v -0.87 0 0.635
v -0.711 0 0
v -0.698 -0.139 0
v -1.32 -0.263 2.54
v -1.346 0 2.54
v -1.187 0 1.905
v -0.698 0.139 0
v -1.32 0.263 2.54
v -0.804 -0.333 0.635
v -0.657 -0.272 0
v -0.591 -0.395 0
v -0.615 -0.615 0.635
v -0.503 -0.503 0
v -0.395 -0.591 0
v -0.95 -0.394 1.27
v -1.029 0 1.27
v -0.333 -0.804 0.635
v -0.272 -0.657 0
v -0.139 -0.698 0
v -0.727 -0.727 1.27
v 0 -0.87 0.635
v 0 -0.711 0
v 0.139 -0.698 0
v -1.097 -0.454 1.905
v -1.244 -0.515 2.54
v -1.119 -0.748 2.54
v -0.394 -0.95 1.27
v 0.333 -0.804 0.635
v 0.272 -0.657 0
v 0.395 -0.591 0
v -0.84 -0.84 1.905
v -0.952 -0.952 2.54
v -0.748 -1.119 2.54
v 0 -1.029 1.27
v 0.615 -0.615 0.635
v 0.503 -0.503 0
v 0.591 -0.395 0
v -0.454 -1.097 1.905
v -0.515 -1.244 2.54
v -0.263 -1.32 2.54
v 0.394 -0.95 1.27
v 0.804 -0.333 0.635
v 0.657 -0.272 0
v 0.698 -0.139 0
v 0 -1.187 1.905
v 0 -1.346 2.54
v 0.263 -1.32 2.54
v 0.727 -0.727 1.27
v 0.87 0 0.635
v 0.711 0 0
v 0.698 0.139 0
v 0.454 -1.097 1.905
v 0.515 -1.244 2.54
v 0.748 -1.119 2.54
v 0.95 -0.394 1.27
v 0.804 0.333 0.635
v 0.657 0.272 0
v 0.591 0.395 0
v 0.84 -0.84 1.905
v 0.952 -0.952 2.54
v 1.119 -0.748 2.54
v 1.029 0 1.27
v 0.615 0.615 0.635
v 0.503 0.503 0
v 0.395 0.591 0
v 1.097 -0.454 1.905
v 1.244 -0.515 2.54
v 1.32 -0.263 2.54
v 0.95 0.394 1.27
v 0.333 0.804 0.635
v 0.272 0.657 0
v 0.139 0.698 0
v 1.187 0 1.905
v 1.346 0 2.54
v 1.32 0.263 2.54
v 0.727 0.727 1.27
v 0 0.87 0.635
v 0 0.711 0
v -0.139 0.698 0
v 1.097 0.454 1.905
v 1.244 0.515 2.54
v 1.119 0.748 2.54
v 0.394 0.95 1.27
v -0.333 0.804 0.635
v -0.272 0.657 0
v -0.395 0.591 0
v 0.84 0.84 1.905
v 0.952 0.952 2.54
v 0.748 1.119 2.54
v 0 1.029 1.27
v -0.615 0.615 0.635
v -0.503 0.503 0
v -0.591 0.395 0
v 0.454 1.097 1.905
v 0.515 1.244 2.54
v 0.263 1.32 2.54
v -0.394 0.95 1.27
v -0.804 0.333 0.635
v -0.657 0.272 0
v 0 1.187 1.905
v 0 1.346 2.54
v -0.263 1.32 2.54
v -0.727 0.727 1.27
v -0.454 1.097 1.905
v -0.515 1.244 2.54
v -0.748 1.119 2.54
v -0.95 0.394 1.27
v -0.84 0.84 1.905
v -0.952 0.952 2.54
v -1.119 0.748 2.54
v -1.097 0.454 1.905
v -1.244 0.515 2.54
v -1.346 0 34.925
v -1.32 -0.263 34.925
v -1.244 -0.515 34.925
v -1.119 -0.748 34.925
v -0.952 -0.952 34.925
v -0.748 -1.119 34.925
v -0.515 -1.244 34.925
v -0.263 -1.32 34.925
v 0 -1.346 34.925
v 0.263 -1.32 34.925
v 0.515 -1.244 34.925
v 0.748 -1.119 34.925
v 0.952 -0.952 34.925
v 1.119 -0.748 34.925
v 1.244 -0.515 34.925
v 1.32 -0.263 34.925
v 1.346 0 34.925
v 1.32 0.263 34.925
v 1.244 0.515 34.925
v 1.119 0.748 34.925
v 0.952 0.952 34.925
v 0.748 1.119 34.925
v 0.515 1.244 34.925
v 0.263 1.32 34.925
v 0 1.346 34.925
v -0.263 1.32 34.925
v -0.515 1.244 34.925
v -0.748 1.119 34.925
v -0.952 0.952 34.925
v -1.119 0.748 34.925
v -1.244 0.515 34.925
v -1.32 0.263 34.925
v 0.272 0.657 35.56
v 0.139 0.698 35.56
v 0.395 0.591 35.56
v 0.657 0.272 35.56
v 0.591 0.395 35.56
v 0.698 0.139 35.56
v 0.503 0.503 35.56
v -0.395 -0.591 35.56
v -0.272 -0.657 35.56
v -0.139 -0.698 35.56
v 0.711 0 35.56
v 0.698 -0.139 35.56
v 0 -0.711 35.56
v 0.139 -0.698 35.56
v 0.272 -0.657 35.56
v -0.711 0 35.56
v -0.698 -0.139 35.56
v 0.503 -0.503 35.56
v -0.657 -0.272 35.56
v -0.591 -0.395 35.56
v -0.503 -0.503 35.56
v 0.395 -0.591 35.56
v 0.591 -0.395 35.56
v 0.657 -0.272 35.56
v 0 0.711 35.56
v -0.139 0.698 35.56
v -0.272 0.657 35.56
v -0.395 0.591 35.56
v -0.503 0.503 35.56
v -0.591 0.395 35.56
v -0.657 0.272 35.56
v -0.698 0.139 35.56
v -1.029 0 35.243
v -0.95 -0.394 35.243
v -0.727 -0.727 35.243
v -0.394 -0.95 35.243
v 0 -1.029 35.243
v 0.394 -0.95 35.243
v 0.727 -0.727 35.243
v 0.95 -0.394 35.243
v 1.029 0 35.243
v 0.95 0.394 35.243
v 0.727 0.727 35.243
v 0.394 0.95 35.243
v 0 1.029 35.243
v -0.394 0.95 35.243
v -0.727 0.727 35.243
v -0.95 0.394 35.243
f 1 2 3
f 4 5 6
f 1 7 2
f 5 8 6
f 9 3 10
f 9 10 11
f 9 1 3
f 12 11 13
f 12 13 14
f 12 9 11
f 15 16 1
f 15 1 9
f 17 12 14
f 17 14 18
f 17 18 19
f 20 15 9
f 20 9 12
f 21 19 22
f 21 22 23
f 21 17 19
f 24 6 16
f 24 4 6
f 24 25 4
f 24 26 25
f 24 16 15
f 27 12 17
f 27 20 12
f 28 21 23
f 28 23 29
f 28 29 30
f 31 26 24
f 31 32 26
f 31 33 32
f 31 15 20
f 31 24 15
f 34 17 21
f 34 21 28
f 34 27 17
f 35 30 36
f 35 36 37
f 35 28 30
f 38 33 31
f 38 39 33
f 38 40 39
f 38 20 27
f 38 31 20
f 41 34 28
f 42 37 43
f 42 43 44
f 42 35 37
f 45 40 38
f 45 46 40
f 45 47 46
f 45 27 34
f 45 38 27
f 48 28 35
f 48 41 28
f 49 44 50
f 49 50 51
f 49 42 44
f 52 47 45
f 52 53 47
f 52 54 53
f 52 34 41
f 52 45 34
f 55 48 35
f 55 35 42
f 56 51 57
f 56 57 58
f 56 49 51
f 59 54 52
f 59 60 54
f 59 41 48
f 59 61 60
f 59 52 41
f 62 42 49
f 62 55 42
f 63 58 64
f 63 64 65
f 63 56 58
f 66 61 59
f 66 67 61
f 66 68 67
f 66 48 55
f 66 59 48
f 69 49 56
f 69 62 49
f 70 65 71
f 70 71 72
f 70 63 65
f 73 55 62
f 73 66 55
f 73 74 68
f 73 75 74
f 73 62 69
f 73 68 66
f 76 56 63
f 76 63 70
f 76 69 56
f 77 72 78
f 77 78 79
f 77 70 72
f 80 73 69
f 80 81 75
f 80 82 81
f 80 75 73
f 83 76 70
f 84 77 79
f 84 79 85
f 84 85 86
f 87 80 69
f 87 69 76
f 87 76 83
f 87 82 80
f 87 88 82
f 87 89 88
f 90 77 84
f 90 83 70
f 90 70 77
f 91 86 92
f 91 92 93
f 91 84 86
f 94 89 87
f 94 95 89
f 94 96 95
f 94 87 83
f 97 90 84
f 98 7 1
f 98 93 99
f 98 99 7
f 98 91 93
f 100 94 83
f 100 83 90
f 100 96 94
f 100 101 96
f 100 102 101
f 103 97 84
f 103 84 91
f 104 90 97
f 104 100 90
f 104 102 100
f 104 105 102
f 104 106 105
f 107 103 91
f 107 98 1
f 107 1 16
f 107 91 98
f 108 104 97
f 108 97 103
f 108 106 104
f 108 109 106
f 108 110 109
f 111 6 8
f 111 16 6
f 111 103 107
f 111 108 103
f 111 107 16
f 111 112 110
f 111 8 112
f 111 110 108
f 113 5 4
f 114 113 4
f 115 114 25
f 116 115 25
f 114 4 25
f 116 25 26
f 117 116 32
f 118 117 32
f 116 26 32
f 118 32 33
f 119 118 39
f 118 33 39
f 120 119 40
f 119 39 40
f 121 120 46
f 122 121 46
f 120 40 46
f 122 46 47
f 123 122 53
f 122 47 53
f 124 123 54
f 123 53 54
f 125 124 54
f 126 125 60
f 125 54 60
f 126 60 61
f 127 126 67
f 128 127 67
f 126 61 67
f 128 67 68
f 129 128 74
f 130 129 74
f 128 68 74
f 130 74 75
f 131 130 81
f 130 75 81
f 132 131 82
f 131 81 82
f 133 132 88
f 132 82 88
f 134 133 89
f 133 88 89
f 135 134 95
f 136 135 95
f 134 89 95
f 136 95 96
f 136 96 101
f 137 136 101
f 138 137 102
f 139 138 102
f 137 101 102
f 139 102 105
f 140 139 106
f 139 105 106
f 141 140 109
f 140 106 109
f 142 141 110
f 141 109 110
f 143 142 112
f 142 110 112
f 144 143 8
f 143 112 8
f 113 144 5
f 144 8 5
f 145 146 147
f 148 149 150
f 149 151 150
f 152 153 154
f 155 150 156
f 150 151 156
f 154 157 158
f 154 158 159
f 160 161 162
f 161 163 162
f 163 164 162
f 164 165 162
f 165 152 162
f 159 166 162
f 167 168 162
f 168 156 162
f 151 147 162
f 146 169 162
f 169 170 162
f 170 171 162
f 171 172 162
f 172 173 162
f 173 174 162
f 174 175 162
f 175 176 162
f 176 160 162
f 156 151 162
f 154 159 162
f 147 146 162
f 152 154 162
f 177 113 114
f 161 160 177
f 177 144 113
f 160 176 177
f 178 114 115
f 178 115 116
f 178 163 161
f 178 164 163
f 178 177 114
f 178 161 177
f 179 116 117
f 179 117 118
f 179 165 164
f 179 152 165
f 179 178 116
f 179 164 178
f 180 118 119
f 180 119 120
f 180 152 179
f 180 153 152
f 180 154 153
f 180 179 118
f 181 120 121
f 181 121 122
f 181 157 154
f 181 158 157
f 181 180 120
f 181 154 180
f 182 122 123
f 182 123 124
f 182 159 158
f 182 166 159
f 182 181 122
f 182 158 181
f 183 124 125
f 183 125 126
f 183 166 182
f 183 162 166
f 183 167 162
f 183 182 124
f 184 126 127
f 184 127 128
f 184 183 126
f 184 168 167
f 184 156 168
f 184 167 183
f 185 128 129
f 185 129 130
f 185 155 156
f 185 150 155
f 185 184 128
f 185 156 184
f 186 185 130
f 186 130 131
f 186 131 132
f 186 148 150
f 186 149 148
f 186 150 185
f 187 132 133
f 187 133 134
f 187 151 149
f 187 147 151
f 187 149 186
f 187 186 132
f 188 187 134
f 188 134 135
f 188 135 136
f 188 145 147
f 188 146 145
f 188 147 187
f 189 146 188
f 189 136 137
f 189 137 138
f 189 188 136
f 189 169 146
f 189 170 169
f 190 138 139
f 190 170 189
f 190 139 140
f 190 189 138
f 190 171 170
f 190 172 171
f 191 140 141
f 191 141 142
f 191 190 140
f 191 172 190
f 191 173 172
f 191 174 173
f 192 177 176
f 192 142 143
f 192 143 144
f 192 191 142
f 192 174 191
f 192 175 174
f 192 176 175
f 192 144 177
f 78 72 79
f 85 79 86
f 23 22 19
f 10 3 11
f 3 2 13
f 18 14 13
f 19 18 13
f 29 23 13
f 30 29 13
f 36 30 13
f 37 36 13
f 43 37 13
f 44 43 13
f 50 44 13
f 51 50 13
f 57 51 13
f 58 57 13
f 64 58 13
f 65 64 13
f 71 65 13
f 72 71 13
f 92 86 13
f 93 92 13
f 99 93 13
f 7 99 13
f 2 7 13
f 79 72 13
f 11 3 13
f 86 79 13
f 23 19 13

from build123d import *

# Parameters (mm, degrees)
F2_SIZE2 = 2.54
F2_SIZE  = 0.635
F3_SIZE  = 0.635


with BuildPart() as f1:
    # F0 (on Front) → F1 (revolve)
    with BuildSketch(Plane.XZ):
        Polygon((-1.3462, 0), (0, 0), (0, 35.56), (-1.3462, 35.56), (-1.3462, 12.7), align=None)
    revolve(axis=Axis((0, 0, 17.78), (0, 0, 1)))

    # F2
    f2_edges = [f1.edges().sort_by_distance(p)[0] for p in [
        (1.3462, 0, 0),
    ]]
    chamfer(f2_edges, length=F2_SIZE, length2=F2_SIZE2)

    # F3
    f3_edges = [f1.edges().sort_by_distance(p)[0] for p in [
        (1.3462, 0, 35.56),
    ]]
    chamfer(f3_edges, length=F3_SIZE)


solid = f1.part
